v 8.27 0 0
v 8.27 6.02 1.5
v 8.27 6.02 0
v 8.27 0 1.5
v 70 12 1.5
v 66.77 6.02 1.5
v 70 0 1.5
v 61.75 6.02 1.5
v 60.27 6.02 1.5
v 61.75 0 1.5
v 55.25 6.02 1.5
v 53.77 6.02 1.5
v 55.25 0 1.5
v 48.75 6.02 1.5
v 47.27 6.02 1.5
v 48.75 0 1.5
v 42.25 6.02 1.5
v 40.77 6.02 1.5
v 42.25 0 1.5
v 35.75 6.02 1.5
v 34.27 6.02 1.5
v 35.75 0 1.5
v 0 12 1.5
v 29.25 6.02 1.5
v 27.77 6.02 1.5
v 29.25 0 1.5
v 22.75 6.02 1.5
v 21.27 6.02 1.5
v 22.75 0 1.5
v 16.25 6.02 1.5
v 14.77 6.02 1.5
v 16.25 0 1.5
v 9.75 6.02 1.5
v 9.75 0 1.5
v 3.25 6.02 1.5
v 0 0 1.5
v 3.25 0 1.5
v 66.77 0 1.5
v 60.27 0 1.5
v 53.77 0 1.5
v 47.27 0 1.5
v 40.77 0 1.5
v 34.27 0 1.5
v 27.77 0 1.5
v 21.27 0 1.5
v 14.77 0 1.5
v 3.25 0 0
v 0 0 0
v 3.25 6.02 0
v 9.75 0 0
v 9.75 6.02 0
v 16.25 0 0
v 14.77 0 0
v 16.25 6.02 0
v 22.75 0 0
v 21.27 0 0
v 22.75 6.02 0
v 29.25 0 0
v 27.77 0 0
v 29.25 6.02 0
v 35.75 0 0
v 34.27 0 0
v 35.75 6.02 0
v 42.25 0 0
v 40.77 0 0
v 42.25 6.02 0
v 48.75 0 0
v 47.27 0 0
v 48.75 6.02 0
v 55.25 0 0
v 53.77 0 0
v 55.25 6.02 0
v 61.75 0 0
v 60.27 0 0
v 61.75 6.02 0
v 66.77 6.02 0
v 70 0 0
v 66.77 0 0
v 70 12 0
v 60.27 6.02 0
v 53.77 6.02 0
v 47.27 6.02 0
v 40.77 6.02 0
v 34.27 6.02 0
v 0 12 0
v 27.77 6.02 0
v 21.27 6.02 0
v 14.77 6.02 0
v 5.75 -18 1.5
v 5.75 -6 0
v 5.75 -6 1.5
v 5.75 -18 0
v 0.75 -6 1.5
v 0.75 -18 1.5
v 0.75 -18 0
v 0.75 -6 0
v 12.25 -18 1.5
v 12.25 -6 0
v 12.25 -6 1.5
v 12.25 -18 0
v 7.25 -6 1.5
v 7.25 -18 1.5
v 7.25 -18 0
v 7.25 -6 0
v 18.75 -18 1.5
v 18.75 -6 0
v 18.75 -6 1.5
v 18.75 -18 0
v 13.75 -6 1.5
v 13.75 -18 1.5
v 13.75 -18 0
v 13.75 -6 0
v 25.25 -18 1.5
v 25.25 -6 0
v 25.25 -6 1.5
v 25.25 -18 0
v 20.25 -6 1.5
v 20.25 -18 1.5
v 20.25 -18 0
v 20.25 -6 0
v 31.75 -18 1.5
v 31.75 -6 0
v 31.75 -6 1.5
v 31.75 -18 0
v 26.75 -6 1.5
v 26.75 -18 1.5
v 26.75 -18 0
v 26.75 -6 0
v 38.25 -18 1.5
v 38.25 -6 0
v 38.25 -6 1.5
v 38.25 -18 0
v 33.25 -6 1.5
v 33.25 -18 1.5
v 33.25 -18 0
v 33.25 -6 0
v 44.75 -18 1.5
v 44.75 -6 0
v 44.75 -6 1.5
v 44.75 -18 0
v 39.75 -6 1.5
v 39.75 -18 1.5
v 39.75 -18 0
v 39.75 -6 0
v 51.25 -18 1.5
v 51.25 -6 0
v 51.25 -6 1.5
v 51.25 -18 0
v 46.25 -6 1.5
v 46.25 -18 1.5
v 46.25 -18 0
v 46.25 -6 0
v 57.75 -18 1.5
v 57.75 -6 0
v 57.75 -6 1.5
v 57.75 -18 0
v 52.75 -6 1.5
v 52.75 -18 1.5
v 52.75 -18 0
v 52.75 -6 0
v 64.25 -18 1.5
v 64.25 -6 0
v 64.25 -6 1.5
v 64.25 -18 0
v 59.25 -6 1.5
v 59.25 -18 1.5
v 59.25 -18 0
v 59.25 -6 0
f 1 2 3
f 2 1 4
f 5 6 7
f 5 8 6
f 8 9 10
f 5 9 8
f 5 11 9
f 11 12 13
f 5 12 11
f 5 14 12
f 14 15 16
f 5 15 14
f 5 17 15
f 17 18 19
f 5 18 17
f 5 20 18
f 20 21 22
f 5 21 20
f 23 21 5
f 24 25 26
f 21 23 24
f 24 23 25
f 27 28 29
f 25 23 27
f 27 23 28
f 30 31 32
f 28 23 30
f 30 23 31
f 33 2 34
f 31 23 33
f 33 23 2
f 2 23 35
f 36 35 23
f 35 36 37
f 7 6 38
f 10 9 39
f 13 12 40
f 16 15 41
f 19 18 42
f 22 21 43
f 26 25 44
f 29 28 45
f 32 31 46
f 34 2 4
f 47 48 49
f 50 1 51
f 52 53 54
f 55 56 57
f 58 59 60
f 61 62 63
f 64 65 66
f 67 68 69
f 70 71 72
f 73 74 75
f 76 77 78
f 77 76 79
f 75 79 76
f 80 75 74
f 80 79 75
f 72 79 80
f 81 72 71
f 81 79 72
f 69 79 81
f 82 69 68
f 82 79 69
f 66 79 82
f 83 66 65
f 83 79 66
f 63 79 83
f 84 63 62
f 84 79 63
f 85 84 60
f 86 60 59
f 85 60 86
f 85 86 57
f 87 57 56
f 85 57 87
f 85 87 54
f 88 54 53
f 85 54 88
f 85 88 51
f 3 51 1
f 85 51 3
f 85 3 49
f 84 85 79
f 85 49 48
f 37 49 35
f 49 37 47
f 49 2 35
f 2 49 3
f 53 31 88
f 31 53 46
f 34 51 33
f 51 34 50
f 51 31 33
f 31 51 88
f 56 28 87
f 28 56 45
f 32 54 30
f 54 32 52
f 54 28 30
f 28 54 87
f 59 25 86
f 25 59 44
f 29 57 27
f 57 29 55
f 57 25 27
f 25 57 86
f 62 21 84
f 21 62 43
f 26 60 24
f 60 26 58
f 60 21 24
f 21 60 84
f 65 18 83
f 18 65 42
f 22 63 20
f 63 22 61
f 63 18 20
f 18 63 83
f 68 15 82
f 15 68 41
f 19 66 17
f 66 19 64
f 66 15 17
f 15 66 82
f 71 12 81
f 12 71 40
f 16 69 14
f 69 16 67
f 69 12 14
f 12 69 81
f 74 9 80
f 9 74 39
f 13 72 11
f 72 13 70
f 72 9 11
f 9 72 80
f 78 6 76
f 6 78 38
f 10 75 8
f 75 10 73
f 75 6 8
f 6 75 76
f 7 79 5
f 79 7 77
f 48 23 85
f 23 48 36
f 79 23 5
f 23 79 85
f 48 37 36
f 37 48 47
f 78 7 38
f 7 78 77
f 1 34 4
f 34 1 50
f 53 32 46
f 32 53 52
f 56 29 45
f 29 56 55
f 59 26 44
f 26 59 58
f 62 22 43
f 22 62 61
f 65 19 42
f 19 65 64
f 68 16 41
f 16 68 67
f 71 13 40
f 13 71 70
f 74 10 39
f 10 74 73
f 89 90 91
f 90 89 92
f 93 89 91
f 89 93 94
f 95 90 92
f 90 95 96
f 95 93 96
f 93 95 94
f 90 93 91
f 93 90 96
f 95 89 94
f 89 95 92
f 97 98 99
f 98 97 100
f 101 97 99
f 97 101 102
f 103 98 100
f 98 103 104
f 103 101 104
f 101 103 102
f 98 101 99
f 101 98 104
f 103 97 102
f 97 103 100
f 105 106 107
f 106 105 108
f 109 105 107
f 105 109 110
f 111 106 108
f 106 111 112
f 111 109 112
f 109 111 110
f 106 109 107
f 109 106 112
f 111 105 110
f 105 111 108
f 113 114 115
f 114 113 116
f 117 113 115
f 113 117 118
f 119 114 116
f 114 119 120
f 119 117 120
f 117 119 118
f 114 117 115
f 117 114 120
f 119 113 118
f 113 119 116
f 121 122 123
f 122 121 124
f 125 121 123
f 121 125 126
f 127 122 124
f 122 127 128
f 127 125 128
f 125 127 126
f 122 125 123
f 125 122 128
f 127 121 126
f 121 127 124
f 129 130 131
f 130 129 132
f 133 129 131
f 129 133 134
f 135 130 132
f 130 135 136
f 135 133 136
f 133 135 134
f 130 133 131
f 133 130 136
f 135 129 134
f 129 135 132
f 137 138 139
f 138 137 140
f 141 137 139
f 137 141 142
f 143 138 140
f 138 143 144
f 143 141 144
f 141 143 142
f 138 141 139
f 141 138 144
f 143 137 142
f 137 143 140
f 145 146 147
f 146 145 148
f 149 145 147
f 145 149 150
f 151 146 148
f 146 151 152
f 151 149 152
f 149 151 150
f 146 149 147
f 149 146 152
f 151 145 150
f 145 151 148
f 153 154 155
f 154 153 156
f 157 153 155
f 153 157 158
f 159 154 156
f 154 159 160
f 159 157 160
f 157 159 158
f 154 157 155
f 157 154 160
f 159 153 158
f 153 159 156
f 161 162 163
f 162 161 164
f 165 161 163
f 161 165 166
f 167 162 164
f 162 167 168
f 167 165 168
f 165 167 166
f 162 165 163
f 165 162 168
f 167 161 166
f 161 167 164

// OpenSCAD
// 10-well Agarose Gel Comb
// Designed for FDM printing, lying flat on the XY plane (Z=0).
// Dimensions in millimetres.

$fn = 100; // High resolution for smooth edges

// --- Dimensions ---
SPINE_LENGTH = 70;  // X
SPINE_WIDTH = 12;   // Y
PLATE_THICKNESS = 1.5; // Z

TOOTH_WIDTH = 5.0;  // X
TOOTH_LENGTH = 12;  // Y (extends from spine edge)
NUM_TEETH = 10;
GAP_SIZE = 1.5;     // Gap between teeth

// --- Calculations ---
// Total width of the tooth row
TOOTH_ROW_WIDTH = (NUM_TEETH * TOOTH_WIDTH) + ((NUM_TEETH - 1) * GAP_SIZE);

// Offset to center the tooth row on the spine in X
X_OFFSET = (SPINE_LENGTH - TOOTH_ROW_WIDTH) / 2;

// Spine geometry: Centered at (0,0) in XY.
// Spine Y range: -SPINE_WIDTH/2 to +SPINE_WIDTH/2
// Spine Edge (where teeth hang): Y = -SPINE_WIDTH/2
SPINE_EDGE_Y = -SPINE_WIDTH / 2;

// Tooth Y range: Starts at SPINE_EDGE_Y, extends TOOTH_LENGTH in -Y direction.
// Tooth Center Y = SPINE_EDGE_Y - (TOOTH_LENGTH / 2)
TOOTH_CENTER_Y = SPINE_EDGE_Y - (TOOTH_LENGTH / 2);

// --- Main Body Construction ---
// We use a single union to merge the "Spine with Slots" and the "Teeth" into one solid body.
// This ensures the output is 1 separate body.

union() {
    // Part 1: Spine with slots cut out
    difference() {
        // The full spine block
        translate([0, 0, 0]) {
            cube([SPINE_LENGTH, SPINE_WIDTH, PLATE_THICKNESS], center = false);
        }
        
        // Cut out slots for the teeth
        // We cut a rectangle for each tooth slot.
        // The slot extends from the spine edge (SPINE_EDGE_Y) downwards by TOOTH_LENGTH.
        // The slot width is TOOTH_WIDTH.
        // We extend the cut slightly (0.02mm) to ensure clean separation.
        
        for (i = [0 : NUM_TEETH - 1]) {
            // Calculate X position for this tooth
            tooth_x = X_OFFSET + (i * (TOOTH_WIDTH + GAP_SIZE));
            
            // Calculate Y position for the slot
            // The slot spans from SPINE_EDGE_Y down to SPINE_EDGE_Y - TOOTH_LENGTH
            translate([tooth_x, SPINE_EDGE_Y, 0]) {
                // Cut a rectangle slightly larger than the tooth to ensure separation
                cube([TOOTH_WIDTH + 0.02, TOOTH_LENGTH + 0.02, PLATE_THICKNESS], center = false);
            }
        }
    }
    
    // Part 2: The solid teeth
    // They sit on the bed (Z=0) and go up to PLATE_THICKNESS.
    // They hang from the spine edge.
    
    for (i = [0 : NUM_TEETH - 1]) {
        tooth_x = X_OFFSET + (i * (TOOTH_WIDTH + GAP_SIZE));
        
        // Position the tooth
        // X: tooth_x
        // Y: tooth_x is center. Y center is TOOTH_CENTER_Y.
        // Z: Centered at PLATE_THICKNESS/2
        
        translate([tooth_x, TOOTH_CENTER_Y, PLATE_THICKNESS / 2]) {
            cube([TOOTH_WIDTH, TOOTH_LENGTH, PLATE_THICKNESS], center = true);
        }
    }
}
